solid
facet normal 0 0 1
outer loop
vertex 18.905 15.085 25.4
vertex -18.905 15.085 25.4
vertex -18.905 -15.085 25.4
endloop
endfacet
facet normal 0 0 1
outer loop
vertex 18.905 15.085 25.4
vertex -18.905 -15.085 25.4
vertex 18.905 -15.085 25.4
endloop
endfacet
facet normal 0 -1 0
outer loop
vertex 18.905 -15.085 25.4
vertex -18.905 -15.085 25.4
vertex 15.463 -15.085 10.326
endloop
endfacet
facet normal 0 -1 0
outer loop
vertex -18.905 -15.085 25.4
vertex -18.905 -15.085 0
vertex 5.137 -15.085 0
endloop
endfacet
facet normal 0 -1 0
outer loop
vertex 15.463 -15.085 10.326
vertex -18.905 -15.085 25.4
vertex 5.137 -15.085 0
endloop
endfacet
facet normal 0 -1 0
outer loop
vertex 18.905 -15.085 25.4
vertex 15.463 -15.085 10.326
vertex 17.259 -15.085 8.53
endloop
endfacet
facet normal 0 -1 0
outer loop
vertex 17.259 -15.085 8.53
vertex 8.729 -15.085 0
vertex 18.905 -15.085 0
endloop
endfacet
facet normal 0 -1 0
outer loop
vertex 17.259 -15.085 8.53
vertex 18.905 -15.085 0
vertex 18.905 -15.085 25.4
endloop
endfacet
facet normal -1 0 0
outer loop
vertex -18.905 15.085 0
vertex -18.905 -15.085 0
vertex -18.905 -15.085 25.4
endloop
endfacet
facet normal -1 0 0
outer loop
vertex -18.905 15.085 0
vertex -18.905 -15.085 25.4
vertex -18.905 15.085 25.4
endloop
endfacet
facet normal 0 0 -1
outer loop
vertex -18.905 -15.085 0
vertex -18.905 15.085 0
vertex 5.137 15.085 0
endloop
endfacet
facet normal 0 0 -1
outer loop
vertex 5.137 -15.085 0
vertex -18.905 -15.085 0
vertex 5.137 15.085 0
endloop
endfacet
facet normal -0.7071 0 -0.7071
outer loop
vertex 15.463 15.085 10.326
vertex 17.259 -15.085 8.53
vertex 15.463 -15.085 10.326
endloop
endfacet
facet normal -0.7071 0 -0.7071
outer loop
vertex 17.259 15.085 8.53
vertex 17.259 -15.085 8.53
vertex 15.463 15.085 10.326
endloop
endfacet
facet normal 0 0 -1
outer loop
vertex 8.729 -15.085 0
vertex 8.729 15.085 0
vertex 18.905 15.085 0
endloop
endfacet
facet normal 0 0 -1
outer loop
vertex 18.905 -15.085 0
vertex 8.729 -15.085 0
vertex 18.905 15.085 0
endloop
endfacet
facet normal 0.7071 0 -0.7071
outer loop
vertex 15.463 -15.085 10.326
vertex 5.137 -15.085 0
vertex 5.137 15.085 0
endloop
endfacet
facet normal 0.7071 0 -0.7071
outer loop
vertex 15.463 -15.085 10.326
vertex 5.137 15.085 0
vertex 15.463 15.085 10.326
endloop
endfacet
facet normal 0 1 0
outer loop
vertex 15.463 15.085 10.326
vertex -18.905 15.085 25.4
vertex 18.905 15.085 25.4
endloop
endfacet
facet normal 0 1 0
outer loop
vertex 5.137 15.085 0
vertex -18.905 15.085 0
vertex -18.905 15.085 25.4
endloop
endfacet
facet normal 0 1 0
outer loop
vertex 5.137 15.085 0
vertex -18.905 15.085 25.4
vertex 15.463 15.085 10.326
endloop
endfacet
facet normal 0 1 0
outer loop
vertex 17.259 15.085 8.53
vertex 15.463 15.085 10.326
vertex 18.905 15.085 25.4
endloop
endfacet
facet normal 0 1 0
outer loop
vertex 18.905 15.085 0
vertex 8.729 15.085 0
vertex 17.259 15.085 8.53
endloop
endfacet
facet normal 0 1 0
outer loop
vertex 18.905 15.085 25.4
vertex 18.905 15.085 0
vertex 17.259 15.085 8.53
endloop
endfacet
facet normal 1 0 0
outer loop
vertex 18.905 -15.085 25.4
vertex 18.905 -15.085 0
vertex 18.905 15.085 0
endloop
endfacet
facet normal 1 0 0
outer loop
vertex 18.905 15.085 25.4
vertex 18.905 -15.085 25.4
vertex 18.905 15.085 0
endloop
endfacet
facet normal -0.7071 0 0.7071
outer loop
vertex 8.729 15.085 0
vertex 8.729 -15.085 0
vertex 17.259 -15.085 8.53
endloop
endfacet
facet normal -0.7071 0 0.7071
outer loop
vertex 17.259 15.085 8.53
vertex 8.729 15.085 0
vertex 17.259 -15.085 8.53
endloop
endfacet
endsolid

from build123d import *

# Parameters (mm, degrees)
F0_W     = 37.809022
F0_H     = 30.170836
F1_DEPTH = 25.4
F4_W     = 43.719644
F4_H     = 120.03813
F5_DEPTH = 2.54


with BuildPart() as f1:
    # F0 (on Top) → F1 (new body)
    with BuildSketch(Plane.XY):
        Rectangle(F0_W, F0_H)
    extrude(amount=F1_DEPTH)


with BuildPart() as f5:
    # F4 (on face) → F5 (new body)
    with BuildSketch(Plane(origin=(14.130645, 0, -14.130645), x_dir=(0.707107, 0, 0.707107), z_dir=(-0.707107, 0, 0.707107))):
        with Locations((10.187182, -33.240173)):
            Rectangle(F4_W, F4_H)
    extrude(amount=F5_DEPTH)


with BuildPart() as f5_1:
    # F6: moved
    add(f5.part.moved(Location((-19.5326, 0, 0))))


with BuildPart() as f1_1:
    add(f1.part)

    # F7: cut F5
    add(f5_1.part, mode=Mode.SUBTRACT)


solid = f1_1.part
